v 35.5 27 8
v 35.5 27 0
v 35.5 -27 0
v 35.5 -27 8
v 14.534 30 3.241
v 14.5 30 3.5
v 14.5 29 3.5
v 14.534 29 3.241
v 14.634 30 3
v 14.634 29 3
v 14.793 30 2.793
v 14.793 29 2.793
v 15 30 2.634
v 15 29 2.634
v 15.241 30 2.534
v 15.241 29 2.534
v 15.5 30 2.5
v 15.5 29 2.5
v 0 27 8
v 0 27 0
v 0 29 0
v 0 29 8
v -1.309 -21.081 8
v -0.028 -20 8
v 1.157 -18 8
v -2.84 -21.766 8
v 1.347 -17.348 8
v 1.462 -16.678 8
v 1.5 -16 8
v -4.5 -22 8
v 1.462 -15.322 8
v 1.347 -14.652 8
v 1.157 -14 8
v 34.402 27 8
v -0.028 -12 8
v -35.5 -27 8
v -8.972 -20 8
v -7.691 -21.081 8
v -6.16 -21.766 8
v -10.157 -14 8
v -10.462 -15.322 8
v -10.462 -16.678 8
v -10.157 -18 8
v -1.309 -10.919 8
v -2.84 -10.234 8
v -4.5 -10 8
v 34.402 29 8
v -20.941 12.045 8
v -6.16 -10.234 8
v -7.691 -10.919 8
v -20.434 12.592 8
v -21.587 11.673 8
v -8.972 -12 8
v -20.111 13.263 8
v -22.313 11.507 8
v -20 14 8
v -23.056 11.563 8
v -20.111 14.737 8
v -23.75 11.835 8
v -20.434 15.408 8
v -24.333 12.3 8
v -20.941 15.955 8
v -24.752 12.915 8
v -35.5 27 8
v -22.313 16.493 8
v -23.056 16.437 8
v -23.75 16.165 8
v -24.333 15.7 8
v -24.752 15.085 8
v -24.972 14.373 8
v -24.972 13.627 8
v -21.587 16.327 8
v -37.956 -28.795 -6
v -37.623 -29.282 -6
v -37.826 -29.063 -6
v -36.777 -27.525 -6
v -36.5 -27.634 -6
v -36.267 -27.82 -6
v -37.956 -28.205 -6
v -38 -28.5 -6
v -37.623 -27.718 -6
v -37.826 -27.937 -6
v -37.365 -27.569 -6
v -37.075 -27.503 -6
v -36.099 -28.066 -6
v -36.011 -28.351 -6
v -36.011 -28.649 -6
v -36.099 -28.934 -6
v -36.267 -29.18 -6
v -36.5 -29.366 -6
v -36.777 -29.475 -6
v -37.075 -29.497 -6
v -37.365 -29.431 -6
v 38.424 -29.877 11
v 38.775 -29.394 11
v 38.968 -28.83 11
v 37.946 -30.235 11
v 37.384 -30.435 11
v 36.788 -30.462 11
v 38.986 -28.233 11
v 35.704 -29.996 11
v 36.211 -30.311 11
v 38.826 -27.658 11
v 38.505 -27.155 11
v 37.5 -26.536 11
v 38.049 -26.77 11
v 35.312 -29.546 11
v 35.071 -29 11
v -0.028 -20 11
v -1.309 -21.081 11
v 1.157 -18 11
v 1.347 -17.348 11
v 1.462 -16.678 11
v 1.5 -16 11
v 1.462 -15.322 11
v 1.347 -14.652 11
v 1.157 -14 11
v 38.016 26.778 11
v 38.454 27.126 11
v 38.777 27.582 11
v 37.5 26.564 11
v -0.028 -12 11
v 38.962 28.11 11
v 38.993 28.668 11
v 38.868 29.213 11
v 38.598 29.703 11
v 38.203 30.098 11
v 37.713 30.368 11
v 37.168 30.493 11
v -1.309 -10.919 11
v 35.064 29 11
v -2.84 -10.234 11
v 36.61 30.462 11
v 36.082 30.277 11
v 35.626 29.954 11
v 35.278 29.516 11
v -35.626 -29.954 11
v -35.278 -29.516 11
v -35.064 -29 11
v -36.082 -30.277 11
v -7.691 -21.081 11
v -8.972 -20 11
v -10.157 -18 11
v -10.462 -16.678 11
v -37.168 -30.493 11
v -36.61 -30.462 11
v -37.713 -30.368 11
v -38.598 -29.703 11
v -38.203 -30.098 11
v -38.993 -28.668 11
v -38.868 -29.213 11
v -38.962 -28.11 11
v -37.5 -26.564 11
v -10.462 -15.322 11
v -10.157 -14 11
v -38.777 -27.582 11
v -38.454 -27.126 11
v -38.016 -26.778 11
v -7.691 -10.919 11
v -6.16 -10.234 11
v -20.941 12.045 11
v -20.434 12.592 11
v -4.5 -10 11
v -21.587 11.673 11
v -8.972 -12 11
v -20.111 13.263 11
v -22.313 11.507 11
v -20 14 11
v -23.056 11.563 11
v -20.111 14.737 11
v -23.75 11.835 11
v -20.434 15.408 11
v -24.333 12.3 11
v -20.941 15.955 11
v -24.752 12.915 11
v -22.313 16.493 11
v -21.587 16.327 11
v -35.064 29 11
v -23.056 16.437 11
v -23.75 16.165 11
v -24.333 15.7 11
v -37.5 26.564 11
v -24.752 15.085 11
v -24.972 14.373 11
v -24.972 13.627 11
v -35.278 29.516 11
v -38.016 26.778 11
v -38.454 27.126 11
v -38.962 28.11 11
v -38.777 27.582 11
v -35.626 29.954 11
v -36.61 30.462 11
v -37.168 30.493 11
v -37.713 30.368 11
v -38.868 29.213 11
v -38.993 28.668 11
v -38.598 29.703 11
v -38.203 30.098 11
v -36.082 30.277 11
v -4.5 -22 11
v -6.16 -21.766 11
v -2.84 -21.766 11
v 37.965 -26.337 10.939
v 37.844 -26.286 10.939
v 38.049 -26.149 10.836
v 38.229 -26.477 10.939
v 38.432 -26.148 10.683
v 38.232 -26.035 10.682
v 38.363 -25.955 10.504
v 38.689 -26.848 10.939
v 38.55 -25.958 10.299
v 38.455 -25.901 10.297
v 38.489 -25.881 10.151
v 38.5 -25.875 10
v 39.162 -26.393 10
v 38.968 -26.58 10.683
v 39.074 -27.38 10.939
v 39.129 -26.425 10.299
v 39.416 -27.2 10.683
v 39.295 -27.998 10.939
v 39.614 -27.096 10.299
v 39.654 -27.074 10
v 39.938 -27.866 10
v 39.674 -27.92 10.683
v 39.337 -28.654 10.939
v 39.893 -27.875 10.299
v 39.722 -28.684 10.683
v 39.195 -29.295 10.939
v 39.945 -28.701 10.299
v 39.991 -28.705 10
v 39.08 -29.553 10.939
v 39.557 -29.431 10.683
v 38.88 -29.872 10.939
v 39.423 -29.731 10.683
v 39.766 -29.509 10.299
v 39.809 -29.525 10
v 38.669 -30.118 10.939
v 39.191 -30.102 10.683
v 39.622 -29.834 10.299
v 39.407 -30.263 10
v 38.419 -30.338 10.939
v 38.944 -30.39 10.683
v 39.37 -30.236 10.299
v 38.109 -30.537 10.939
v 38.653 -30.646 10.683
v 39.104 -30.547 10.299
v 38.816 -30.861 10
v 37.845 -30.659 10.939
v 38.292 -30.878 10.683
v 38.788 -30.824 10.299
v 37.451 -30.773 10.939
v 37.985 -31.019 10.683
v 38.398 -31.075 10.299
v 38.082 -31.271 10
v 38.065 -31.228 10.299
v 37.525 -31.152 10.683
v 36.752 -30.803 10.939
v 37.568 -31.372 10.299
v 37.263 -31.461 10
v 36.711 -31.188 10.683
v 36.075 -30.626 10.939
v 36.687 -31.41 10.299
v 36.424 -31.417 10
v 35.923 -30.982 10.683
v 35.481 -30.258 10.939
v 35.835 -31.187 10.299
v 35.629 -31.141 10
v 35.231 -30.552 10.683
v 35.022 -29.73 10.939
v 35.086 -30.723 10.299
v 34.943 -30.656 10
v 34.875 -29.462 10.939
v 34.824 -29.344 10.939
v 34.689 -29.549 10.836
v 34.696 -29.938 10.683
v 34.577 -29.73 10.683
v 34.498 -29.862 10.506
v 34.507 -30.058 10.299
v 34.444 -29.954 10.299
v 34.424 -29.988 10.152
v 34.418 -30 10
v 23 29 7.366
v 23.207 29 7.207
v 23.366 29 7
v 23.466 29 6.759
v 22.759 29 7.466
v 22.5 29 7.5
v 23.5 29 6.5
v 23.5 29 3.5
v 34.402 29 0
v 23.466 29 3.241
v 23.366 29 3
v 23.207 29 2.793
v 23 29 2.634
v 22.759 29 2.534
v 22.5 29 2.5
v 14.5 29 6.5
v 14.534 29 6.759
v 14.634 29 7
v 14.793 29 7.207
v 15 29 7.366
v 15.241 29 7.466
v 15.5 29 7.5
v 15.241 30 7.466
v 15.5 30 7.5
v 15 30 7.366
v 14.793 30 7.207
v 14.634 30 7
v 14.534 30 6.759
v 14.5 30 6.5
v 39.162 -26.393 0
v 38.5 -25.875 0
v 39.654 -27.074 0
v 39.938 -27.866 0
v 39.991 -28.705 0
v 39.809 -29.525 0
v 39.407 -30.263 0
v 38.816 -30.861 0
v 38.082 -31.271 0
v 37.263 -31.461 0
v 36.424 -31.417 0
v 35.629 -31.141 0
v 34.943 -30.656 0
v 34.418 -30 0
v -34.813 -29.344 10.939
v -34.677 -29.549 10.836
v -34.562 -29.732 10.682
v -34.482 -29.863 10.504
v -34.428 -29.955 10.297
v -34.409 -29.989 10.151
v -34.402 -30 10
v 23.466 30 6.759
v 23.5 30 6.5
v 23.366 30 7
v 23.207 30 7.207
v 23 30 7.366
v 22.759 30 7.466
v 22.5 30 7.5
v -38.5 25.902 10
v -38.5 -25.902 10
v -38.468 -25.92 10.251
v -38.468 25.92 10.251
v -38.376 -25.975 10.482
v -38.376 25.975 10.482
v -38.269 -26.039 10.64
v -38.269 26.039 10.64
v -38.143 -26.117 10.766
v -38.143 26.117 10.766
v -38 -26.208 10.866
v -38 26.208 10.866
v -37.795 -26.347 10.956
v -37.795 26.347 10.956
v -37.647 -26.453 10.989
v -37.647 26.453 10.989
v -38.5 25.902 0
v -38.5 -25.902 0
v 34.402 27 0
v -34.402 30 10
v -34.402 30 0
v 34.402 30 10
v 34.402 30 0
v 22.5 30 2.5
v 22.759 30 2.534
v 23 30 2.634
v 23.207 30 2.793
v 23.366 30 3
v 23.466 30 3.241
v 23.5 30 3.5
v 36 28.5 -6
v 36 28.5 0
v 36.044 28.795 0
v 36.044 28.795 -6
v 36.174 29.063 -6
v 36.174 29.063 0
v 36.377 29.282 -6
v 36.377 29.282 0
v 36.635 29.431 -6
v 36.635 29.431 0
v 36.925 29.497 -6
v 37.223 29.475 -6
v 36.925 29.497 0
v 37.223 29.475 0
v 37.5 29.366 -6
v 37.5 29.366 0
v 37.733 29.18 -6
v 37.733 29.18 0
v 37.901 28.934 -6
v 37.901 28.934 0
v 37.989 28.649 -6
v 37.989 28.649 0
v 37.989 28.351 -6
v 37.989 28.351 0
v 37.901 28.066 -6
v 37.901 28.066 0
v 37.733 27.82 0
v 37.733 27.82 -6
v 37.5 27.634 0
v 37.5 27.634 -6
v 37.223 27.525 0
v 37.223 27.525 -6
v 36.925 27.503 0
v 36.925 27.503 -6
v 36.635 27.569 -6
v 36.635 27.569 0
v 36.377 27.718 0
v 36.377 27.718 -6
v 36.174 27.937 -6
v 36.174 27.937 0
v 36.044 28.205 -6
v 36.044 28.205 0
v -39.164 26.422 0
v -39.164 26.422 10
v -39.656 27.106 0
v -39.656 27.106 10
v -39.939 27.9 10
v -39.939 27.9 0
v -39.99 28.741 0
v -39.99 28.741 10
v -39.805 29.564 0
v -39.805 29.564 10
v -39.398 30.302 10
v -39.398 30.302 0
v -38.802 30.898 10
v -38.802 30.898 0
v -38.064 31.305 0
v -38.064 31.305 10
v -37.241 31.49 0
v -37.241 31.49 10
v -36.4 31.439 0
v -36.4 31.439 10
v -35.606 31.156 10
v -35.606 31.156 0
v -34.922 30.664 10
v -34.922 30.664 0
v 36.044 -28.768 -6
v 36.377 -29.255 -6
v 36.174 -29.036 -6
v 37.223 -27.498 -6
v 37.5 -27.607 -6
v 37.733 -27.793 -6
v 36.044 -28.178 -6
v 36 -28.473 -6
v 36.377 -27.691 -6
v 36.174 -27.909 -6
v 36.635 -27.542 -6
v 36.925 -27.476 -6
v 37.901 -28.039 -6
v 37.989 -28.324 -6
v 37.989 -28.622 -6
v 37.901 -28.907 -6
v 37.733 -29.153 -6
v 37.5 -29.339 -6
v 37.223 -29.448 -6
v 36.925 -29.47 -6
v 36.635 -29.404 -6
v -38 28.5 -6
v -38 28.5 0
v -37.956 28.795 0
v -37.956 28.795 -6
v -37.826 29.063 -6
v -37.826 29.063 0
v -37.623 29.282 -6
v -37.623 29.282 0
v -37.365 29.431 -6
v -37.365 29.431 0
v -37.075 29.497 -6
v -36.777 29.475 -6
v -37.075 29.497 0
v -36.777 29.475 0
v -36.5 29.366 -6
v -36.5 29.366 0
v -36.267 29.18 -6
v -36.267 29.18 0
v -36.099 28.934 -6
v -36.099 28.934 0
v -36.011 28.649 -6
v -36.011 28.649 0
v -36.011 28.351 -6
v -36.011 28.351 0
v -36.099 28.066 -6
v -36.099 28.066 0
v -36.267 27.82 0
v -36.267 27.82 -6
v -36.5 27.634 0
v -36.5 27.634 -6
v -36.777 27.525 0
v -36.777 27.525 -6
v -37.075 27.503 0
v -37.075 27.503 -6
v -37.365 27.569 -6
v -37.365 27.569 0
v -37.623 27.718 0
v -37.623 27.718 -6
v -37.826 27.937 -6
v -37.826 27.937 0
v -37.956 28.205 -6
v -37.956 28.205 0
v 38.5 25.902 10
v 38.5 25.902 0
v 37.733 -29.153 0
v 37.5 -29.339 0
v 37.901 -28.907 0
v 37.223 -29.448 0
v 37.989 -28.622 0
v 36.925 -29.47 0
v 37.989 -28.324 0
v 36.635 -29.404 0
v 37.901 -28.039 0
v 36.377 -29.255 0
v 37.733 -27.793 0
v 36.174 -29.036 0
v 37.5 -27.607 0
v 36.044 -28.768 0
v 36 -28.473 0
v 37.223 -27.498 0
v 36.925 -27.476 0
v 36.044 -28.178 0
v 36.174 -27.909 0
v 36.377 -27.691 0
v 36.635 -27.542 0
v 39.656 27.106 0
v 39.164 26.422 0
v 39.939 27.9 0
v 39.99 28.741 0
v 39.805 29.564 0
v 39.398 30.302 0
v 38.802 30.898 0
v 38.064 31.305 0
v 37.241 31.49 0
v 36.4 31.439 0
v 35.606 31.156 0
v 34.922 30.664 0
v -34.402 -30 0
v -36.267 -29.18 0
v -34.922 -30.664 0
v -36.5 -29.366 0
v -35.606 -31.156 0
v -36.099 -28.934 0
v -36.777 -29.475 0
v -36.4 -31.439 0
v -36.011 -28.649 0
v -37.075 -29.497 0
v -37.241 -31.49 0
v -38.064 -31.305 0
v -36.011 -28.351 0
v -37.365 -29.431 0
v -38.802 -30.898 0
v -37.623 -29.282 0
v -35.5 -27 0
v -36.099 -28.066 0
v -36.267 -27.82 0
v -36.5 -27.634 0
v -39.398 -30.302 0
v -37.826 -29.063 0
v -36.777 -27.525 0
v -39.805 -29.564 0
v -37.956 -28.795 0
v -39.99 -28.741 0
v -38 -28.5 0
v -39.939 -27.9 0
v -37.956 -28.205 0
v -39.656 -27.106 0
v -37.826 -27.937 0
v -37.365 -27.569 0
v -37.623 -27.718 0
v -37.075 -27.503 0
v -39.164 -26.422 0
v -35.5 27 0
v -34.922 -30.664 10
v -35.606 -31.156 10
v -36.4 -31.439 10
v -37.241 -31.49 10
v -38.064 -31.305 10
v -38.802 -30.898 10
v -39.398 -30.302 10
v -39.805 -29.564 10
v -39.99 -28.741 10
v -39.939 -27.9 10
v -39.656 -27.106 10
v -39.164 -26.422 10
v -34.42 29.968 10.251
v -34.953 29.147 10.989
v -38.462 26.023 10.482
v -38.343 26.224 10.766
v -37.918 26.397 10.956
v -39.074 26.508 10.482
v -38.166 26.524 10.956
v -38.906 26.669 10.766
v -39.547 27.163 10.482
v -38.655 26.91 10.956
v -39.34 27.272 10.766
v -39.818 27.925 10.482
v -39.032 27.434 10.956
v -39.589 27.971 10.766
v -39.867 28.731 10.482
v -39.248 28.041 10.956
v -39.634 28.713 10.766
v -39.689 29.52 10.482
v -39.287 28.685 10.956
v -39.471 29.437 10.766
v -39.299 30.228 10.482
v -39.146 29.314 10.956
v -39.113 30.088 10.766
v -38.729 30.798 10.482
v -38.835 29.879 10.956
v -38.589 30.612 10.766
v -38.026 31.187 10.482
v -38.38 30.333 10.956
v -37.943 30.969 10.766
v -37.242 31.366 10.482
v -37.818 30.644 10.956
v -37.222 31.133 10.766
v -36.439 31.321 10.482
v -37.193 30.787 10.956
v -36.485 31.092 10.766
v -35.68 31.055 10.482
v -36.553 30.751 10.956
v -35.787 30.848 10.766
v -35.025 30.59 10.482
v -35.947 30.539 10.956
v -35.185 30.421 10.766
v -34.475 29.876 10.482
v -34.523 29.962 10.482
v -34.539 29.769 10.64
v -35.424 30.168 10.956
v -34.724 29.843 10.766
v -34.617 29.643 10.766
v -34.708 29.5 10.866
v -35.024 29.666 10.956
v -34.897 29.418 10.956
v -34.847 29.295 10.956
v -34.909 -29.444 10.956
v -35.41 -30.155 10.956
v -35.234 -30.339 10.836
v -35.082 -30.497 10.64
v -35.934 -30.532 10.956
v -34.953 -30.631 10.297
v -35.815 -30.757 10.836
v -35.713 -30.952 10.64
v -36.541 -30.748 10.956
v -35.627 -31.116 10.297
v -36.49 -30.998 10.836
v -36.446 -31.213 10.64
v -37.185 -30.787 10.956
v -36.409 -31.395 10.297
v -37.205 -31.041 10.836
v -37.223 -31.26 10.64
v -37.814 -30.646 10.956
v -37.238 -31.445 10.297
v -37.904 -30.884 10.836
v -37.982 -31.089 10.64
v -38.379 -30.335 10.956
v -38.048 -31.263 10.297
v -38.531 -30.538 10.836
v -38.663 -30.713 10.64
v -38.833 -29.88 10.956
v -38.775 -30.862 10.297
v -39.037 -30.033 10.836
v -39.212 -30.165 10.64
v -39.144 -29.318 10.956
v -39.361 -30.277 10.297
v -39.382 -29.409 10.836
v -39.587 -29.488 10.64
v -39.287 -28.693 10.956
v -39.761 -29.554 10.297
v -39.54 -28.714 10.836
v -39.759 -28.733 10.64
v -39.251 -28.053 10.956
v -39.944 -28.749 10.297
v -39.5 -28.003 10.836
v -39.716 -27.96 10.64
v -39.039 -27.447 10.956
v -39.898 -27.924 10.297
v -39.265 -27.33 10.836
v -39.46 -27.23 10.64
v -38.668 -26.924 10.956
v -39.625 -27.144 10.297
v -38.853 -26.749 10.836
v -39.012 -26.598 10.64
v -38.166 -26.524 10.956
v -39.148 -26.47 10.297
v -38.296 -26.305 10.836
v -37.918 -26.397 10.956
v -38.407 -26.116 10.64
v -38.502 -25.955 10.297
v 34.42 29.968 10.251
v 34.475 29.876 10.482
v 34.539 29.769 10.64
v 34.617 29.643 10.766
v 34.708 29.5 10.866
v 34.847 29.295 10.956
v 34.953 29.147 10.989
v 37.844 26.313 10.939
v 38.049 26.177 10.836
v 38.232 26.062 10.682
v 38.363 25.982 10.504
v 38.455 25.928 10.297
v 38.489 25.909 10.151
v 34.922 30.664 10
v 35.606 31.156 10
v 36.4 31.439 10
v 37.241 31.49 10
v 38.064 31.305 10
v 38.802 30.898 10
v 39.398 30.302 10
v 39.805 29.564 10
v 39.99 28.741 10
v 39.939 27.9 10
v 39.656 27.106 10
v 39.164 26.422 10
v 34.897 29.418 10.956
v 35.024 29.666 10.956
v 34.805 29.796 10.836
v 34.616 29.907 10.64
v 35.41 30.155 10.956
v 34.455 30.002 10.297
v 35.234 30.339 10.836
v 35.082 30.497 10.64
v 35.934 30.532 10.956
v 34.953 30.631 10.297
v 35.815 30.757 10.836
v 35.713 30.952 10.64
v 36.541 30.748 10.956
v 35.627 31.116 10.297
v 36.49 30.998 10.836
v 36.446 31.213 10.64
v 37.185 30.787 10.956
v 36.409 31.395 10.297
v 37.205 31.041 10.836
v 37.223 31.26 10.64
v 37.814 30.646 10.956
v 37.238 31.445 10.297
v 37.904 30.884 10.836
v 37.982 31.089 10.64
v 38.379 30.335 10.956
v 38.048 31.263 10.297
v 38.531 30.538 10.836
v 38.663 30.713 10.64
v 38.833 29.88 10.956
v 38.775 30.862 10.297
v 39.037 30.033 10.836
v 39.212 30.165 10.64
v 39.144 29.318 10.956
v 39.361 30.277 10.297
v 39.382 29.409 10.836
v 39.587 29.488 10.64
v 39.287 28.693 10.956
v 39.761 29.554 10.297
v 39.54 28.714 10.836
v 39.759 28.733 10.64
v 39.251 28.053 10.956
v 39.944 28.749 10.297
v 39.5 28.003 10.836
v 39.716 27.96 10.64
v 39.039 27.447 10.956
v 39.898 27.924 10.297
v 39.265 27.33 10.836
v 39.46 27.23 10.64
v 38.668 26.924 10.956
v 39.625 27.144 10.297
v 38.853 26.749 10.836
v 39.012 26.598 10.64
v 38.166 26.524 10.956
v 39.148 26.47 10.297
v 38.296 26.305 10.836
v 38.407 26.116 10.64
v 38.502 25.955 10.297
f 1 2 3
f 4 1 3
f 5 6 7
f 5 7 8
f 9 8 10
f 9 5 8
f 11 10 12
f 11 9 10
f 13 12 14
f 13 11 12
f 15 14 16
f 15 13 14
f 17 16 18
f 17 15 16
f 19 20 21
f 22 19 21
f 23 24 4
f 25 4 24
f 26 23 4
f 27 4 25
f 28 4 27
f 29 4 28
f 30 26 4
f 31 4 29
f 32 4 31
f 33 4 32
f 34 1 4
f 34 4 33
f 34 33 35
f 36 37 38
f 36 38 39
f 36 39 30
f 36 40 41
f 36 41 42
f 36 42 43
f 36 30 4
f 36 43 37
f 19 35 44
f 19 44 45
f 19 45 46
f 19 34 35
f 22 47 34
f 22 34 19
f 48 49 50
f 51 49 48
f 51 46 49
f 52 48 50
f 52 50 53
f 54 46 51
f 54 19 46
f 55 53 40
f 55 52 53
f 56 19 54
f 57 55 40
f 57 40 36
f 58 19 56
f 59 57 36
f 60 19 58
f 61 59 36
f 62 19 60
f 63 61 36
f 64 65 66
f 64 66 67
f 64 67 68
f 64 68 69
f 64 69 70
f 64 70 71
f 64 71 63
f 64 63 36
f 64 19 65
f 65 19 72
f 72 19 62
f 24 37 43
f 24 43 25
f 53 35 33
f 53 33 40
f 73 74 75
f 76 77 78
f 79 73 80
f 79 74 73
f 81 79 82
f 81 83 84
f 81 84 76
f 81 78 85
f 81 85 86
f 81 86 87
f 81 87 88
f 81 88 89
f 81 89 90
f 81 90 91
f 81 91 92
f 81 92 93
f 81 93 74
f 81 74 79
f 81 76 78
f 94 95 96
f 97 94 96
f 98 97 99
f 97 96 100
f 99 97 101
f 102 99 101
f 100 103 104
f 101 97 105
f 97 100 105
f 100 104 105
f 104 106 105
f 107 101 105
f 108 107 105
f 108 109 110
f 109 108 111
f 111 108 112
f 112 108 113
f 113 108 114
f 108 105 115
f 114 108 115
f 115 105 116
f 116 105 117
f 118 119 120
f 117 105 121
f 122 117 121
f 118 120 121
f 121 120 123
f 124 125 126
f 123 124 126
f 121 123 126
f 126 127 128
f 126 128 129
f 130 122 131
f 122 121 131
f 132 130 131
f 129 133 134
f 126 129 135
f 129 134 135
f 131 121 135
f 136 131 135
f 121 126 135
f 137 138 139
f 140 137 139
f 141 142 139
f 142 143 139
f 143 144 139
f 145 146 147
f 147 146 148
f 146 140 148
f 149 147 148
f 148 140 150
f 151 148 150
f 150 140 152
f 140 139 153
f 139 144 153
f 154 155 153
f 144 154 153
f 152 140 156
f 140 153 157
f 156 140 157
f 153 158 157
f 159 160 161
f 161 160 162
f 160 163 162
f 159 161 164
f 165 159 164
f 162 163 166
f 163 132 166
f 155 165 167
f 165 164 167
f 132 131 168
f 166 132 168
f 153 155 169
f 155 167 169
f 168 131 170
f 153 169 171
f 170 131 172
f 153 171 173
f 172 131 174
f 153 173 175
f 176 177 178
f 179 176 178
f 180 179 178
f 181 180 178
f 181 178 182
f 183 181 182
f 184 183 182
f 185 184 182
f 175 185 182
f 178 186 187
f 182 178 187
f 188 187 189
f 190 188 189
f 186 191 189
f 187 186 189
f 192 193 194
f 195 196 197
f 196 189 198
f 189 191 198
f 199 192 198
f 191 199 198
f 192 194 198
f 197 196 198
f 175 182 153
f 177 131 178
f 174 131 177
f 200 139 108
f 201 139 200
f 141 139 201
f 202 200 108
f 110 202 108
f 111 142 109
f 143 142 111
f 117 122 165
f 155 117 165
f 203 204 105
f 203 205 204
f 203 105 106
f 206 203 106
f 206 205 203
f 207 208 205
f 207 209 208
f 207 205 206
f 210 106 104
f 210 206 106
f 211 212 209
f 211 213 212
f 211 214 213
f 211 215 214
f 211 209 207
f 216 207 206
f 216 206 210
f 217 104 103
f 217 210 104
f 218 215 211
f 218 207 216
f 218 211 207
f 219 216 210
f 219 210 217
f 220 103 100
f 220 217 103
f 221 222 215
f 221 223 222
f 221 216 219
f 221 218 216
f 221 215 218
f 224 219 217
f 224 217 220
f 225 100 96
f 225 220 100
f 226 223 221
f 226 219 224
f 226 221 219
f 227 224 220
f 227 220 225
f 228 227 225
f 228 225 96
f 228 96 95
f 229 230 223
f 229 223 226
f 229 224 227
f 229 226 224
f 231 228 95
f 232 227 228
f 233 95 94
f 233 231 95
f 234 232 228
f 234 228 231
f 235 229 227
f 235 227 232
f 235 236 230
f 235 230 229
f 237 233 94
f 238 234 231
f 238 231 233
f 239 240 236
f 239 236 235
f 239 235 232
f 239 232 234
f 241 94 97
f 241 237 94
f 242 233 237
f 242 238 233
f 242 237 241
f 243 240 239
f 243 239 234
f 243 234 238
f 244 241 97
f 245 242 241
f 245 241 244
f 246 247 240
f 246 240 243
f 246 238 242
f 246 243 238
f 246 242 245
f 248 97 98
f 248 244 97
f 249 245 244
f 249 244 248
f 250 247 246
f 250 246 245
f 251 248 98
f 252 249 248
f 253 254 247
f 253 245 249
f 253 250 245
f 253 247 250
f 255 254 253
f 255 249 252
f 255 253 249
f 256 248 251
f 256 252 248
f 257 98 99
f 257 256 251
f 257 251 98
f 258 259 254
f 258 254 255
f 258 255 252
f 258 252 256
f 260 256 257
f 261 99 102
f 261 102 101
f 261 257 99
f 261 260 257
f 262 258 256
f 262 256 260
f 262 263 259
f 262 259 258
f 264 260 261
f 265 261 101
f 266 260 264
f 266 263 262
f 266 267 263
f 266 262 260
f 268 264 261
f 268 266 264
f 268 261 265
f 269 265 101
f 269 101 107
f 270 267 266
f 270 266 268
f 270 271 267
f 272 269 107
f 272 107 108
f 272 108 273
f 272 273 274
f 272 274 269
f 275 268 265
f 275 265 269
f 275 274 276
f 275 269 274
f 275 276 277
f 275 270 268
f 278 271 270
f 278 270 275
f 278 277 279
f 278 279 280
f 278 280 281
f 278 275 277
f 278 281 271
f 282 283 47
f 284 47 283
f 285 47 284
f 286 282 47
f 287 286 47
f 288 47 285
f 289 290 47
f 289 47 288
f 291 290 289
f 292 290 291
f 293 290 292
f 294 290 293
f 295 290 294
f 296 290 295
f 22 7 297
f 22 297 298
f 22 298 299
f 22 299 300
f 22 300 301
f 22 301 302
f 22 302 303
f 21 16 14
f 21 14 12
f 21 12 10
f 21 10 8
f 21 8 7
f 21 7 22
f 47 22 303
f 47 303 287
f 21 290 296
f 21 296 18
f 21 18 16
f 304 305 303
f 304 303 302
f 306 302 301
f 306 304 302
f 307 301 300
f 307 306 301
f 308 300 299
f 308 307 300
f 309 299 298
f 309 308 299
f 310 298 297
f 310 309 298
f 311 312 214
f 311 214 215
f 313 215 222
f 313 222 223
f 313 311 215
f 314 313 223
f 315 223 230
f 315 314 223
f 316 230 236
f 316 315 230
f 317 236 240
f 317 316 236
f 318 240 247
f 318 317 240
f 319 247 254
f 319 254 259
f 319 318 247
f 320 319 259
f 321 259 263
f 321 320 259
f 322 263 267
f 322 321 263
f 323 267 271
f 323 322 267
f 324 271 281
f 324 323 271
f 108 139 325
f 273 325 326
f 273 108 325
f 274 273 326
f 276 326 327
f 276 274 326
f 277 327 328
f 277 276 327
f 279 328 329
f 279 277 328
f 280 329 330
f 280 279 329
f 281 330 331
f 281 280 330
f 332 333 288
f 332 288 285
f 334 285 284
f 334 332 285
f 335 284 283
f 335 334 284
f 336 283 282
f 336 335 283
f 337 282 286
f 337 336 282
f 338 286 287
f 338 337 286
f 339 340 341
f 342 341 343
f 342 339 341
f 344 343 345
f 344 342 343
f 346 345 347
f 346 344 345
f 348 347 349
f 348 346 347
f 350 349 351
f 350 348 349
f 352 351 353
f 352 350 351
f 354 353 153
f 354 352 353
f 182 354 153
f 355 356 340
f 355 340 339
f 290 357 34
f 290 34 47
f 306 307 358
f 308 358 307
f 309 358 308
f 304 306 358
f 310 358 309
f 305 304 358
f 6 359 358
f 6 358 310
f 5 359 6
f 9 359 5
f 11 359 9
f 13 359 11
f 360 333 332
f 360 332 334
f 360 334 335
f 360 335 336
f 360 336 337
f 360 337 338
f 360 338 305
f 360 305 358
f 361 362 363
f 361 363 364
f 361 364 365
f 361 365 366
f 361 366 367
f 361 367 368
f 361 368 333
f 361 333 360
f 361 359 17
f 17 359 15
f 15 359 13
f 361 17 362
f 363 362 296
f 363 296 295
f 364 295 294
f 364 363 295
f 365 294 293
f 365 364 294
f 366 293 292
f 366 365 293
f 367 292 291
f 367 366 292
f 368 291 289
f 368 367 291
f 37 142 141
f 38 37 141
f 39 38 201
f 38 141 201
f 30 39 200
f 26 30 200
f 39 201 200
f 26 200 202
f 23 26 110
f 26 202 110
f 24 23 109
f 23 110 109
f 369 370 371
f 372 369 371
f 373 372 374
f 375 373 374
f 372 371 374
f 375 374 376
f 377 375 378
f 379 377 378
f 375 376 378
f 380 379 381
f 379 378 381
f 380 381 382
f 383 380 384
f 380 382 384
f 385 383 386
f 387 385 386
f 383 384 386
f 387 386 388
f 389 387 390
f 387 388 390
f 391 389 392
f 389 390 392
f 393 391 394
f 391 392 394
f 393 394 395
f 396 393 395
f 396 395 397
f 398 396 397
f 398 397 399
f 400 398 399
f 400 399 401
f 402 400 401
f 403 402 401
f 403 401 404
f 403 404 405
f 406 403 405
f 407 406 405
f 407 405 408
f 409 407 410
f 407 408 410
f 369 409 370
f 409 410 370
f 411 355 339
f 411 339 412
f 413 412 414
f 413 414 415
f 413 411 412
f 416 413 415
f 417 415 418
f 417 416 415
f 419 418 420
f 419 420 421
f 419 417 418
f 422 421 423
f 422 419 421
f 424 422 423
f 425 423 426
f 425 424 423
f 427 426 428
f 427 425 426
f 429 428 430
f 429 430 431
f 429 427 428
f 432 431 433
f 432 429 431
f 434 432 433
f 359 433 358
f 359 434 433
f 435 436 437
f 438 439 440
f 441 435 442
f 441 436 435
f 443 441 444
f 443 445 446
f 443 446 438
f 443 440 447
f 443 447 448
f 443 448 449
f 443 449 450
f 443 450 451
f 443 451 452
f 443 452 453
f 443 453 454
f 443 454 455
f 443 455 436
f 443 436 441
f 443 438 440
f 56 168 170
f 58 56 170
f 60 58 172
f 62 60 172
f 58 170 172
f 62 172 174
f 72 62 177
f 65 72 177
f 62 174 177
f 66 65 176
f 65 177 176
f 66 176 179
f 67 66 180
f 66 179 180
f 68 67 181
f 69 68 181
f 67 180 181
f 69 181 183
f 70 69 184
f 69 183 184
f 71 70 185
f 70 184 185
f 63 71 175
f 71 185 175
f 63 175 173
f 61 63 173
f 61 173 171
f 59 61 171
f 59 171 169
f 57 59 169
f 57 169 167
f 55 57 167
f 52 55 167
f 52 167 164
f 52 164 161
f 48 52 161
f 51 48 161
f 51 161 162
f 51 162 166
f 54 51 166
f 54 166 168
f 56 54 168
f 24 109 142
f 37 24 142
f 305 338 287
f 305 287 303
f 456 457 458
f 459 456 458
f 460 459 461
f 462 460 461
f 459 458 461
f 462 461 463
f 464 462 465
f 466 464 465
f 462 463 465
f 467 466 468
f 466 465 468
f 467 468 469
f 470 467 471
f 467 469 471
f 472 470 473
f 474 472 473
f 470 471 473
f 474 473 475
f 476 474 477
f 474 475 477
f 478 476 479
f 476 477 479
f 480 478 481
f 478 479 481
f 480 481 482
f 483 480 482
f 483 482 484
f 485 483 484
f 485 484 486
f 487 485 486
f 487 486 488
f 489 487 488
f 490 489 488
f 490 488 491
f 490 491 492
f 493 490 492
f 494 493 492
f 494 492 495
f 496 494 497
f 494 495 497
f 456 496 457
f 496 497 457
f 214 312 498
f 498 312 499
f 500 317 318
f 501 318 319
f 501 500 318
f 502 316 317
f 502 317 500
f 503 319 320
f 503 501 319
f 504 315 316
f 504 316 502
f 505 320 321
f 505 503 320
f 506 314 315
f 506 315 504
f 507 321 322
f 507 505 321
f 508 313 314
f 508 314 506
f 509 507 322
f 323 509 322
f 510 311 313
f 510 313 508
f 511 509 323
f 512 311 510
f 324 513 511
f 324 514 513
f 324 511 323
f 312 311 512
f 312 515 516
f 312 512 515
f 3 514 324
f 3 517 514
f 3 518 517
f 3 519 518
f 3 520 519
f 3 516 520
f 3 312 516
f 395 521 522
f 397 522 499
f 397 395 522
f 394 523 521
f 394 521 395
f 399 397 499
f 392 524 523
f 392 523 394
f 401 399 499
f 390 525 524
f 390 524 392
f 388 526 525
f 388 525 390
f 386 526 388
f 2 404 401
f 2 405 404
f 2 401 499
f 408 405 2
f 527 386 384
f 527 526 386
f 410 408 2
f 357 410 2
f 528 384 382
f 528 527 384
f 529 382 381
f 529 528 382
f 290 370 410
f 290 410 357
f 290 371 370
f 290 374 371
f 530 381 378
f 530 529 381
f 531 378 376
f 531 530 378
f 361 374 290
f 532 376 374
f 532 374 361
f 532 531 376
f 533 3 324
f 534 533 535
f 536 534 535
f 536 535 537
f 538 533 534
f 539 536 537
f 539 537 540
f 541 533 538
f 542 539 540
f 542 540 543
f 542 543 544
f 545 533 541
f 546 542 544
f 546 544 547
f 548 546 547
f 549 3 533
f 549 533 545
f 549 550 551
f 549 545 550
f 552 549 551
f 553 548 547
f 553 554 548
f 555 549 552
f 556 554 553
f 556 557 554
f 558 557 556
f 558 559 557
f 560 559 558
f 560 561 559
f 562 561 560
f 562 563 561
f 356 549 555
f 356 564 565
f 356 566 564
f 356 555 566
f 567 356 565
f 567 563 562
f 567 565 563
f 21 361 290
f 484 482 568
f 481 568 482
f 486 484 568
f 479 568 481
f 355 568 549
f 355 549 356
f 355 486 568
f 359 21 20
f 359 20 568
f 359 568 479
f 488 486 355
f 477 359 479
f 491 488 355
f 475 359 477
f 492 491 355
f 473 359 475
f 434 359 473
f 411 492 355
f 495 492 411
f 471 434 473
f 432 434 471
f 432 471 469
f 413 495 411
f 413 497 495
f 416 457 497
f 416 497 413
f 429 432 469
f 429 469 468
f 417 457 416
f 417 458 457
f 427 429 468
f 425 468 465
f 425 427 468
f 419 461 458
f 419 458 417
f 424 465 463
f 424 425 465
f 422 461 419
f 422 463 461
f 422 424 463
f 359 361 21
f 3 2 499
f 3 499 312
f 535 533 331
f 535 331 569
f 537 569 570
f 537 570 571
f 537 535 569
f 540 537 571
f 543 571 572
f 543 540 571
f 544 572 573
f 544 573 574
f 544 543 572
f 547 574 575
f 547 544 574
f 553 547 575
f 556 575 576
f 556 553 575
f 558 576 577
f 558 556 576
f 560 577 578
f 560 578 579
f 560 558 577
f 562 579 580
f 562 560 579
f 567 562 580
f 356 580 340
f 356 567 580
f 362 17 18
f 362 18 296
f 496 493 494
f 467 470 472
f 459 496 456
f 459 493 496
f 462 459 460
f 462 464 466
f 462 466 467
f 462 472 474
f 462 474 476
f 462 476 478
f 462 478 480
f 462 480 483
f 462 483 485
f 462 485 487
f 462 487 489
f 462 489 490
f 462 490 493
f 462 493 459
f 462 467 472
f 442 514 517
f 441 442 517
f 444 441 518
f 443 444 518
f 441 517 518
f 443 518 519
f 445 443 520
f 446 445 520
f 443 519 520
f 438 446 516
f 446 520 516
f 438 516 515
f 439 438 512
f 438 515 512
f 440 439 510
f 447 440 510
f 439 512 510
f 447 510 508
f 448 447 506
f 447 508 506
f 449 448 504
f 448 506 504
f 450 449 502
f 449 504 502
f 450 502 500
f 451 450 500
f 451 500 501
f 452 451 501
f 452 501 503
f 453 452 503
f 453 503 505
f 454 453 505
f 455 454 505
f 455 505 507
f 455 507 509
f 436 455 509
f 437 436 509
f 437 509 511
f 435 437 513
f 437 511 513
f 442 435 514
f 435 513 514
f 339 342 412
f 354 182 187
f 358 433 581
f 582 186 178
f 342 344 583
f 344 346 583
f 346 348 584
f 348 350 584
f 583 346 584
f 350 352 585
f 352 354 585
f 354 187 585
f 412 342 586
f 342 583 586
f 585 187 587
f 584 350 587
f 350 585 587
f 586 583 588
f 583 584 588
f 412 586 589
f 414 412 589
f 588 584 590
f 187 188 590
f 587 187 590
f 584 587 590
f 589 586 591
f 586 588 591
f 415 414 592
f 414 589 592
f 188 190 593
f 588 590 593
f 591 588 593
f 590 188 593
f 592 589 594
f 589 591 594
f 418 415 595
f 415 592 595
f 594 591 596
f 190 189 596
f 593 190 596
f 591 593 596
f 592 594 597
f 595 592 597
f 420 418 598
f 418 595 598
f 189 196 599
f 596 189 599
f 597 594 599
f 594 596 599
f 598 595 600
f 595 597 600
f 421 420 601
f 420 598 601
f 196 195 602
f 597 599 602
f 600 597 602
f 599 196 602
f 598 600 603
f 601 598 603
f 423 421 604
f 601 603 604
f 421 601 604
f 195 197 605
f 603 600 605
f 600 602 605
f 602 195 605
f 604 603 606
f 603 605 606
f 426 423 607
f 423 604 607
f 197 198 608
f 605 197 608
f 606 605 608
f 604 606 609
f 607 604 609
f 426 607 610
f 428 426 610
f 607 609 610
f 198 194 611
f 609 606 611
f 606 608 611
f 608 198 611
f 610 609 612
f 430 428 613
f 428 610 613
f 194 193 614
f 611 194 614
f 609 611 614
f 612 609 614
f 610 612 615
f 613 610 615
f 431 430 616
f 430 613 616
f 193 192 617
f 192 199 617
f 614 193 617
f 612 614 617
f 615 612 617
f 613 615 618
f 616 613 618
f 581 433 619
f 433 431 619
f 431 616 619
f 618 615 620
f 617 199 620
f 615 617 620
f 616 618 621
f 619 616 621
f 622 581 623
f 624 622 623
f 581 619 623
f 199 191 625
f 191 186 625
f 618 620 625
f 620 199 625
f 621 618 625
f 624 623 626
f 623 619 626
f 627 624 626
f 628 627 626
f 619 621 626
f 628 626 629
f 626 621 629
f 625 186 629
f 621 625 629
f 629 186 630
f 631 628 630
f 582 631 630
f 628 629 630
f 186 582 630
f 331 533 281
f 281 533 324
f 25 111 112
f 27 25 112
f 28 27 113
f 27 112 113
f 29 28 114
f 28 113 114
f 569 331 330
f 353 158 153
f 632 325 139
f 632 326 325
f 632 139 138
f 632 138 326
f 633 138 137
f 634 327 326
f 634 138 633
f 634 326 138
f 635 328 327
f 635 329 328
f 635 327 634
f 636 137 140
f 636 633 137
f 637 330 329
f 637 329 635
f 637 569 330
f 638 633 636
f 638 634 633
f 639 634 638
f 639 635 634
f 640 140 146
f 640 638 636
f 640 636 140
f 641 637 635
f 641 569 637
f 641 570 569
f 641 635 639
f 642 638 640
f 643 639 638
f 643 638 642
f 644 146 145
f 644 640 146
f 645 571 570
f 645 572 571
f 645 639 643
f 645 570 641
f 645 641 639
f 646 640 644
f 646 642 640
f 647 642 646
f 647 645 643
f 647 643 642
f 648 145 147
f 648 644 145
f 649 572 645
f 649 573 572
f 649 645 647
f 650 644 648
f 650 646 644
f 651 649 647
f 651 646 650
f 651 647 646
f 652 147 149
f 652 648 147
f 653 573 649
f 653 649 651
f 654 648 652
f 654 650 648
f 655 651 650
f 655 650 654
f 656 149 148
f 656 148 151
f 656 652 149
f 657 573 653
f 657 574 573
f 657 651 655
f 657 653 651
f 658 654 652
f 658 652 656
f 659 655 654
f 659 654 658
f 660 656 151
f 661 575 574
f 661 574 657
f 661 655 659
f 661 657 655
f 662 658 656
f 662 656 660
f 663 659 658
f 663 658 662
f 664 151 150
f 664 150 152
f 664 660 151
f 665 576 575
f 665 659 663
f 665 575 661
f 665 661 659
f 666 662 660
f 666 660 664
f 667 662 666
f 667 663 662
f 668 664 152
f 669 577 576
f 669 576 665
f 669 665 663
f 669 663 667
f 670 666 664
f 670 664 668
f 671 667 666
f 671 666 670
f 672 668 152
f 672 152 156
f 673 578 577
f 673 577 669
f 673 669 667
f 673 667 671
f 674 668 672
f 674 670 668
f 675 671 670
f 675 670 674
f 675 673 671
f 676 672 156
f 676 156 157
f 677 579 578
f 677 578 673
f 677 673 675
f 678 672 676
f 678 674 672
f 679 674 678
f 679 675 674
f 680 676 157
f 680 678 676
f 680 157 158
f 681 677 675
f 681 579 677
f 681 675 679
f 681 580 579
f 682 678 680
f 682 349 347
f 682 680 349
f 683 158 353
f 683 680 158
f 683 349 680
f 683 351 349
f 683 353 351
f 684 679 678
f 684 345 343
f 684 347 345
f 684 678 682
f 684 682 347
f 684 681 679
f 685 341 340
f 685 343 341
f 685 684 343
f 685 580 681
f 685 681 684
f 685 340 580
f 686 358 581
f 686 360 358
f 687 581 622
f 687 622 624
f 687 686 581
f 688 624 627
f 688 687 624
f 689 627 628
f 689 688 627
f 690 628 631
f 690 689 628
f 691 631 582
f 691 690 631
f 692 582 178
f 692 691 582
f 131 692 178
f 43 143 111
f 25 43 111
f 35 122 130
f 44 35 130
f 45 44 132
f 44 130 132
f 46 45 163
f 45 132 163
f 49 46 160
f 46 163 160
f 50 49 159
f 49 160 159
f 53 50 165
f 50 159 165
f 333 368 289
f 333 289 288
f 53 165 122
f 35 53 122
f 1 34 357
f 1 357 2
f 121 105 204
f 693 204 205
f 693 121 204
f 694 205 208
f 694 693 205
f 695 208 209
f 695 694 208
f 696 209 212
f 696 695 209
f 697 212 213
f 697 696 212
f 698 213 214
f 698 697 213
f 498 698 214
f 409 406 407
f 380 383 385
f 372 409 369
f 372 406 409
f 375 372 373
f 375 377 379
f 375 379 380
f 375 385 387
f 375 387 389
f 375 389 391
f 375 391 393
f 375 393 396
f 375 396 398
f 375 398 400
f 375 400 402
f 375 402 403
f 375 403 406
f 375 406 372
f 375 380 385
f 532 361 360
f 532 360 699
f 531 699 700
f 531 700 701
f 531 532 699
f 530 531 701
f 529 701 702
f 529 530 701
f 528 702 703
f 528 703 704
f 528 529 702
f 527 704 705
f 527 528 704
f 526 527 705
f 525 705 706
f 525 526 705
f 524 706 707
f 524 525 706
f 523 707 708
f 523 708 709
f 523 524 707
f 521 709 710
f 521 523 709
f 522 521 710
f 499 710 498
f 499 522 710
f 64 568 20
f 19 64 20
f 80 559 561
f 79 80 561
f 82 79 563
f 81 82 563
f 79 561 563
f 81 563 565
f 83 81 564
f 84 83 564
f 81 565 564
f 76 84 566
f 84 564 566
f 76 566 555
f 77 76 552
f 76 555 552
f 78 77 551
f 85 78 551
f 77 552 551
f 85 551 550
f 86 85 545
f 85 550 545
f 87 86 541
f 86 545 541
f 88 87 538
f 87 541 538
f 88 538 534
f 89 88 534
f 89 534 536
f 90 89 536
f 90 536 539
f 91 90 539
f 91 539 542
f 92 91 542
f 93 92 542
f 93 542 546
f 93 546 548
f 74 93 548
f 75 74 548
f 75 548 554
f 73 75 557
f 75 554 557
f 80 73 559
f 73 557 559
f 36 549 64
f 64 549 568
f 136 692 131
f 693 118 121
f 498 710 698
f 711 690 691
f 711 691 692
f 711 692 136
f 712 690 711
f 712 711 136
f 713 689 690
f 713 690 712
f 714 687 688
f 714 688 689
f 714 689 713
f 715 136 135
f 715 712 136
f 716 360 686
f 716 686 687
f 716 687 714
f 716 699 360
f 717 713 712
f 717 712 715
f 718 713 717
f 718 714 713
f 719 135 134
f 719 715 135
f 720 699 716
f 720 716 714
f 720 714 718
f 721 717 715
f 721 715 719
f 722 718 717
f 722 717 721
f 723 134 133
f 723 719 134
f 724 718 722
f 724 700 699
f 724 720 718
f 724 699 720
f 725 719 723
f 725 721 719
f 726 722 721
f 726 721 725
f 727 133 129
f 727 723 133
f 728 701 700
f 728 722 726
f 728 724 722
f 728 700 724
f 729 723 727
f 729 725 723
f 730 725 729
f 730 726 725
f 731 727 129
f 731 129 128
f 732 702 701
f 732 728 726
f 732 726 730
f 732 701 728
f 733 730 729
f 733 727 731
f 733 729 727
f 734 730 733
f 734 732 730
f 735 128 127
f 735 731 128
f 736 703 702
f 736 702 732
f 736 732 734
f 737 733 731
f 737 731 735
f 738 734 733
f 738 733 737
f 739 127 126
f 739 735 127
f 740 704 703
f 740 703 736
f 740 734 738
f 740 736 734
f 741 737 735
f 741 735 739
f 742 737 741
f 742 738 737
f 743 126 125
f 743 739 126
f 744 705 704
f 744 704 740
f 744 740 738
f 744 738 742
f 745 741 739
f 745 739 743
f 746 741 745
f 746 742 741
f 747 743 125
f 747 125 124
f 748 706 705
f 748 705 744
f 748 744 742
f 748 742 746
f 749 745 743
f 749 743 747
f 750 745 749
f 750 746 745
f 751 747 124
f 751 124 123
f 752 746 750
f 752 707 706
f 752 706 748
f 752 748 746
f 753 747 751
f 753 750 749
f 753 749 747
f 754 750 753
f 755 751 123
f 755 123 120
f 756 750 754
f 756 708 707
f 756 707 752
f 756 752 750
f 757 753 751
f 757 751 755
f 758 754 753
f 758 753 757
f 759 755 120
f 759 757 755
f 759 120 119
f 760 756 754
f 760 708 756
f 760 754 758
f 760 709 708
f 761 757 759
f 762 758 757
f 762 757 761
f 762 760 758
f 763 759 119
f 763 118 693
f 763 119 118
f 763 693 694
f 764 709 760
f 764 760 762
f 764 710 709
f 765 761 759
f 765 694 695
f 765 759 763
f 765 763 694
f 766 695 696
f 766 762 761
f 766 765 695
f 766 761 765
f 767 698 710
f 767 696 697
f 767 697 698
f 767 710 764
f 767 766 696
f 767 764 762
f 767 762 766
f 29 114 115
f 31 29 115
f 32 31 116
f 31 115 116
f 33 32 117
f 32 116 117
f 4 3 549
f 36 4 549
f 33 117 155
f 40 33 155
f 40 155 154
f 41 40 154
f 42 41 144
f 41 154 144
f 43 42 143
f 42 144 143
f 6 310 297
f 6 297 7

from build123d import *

# Parameters (mm, degrees)
SKETCH2_R                  = 1.75
BOSS_EXTRUDE1_DEPTH        = 8
BOSS_EXTRUDE1_DEPTH_BACK   = 12
BOSS_EXTRUDE1_2_DEPTH      = 8
BOSS_EXTRUDE1_2_DEPTH_BACK = 12
BOSS_EXTRUDE1_3_DEPTH      = 8
BOSS_EXTRUDE1_3_DEPTH_BACK = 12
BOSS_EXTRUDE1_4_DEPTH      = 8
BOSS_EXTRUDE1_4_DEPTH_BACK = 12
SKETCH3_W                  = 77
SKETCH3_H                  = 60
SKETCH3_W_2                = 71
SKETCH3_H_2                = 54
BOSS_EXTRUDE2_DEPTH        = 8
SKETCH4_W                  = 77
SKETCH4_H                  = 60
BOSS_EXTRUDE3_DEPTH        = 3
CUT_EXTRUDE6_DEPTH         = 20
CUT_EXTRUDE8_DEPTH         = 13
CUT_EXTRUDE9_DEPTH         = 10
SKETCH17_R                 = 1
BOSS_EXTRUDE5_DEPTH        = 6
BOSS_EXTRUDE5_DEPTH_BACK   = 7
FILLET1_R                  = 1
BOSS_EXTRUDE6_DEPTH        = 11
FILLET3_R                  = 1
SKETCH20_R                 = 2.5
CUT_EXTRUDE10_DEPTH        = 10
SKETCH22_W                 = 34.401923789
SKETCH22_H                 = 2
CUT_EXTRUDE11_DEPTH        = 8


with BuildPart() as part:
    # Sketch2 → Boss-Extrude1 (new body, two sides)
    with BuildSketch(Plane.XY) as boss_extrude1_sk:
        with BuildLine():
            Line((-35.5, -27), (-25.5, -27))
            ThreePointArc((-25.5, -27), (-28.428932188, -19.928932188), (-35.5, -17))
            Line((-35.5, -17), (-35.5, -27))
        make_face()
        with Locations((-33, -23)):
            Circle(SKETCH2_R, mode=Mode.SUBTRACT)
    extrude(amount=BOSS_EXTRUDE1_DEPTH)
    extrude(boss_extrude1_sk.sketch, amount=-BOSS_EXTRUDE1_DEPTH_BACK)



with BuildPart() as body_2:
    # Sketch2 → Boss-Extrude1 2 (new body, two sides)
    with BuildSketch(Plane.XY) as boss_extrude1_2_sk:
        with BuildLine():
            Line((35.5, 27), (35.5, 17))
            ThreePointArc((35.5, 17), (28.428932188, 19.928932188), (25.5, 27))
            Line((25.5, 27), (35.5, 27))
        make_face()
        with Locations((33, 21)):
            Circle(SKETCH2_R, mode=Mode.SUBTRACT)
    extrude(amount=BOSS_EXTRUDE1_2_DEPTH)
    extrude(boss_extrude1_2_sk.sketch, amount=-BOSS_EXTRUDE1_2_DEPTH_BACK)


with BuildPart() as body_3:
    # Sketch2 → Boss-Extrude1 3 (new body, two sides)
    with BuildSketch(Plane.XY) as boss_extrude1_3_sk:
        with BuildLine():
            Line((-35.5, 27), (-25.5, 27))
            ThreePointArc((-25.5, 27), (-28.428932188, 19.928932188), (-35.5, 17))
            Line((-35.5, 17), (-35.5, 27))
        make_face()
        with Locations((-33, 21)):
            Circle(SKETCH2_R, mode=Mode.SUBTRACT)
    extrude(amount=BOSS_EXTRUDE1_3_DEPTH)
    extrude(boss_extrude1_3_sk.sketch, amount=-BOSS_EXTRUDE1_3_DEPTH_BACK)


with BuildPart() as body_4:
    # Sketch2 → Boss-Extrude1 4 (new body, two sides)
    with BuildSketch(Plane.XY) as boss_extrude1_4_sk:
        with BuildLine():
            Line((35.5, -17), (35.5, -27))
            Line((35.5, -27), (25.5, -27))
            ThreePointArc((25.5, -27), (28.428932188, -19.928932188), (35.5, -17))
        make_face()
        with Locations((33, -23)):
            Circle(SKETCH2_R, mode=Mode.SUBTRACT)
    extrude(amount=BOSS_EXTRUDE1_4_DEPTH)
    extrude(boss_extrude1_4_sk.sketch, amount=-BOSS_EXTRUDE1_4_DEPTH_BACK)


with BuildPart() as part_1:
    add(part.part)

    add(body_2.part)  # Boss-Extrude2 merges body 2

    add(body_3.part)  # Boss-Extrude2 merges body 3

    add(body_4.part)  # Boss-Extrude2 merges body 4
    # Sketch3 → Boss-Extrude2 (add)
    with BuildSketch(Plane.XY):
        Rectangle(SKETCH3_W, SKETCH3_H)
        Rectangle(SKETCH3_W_2, SKETCH3_H_2, mode=Mode.SUBTRACT)
    extrude(amount=BOSS_EXTRUDE2_DEPTH)

    # Sketch4 → Boss-Extrude3 (add)
    with BuildSketch(Plane.XY.offset(8)):
        Rectangle(SKETCH4_W, SKETCH4_H)
    extrude(amount=BOSS_EXTRUDE3_DEPTH)

    # Sketch12 → Cut-Extrude6 (cut)
    with BuildSketch(Plane(origin=(0, 0, -12), x_dir=(-1, 0, 0), z_dir=(0, 0, -1))):
        with BuildLine():
            Line((-35.5, -27), (-25.5, -27))
            ThreePointArc((-25.5, -27), (-28.428932188, -19.928932188), (-35.5, -17))
            Line((-35.5, -17), (-35.5, -27))
        make_face()
        with BuildLine():
            Line((35.5, -27), (35.5, -17))
            ThreePointArc((35.5, -17), (28.428932188, -19.928932188), (25.5, -27))
            Line((25.5, -27), (35.5, -27))
        make_face()
        with BuildLine():
            Line((35.5, 17), (35.5, 27))
            Line((35.5, 27), (25.5, 27))
            ThreePointArc((25.5, 27), (28.428932188, 19.928932188), (35.5, 17))
        make_face()
        with BuildLine():
            Line((-25.5, 27), (-35.5, 27))
            Line((-35.5, 27), (-35.5, 17))
            ThreePointArc((-35.5, 17), (-28.428932188, 19.928932188), (-25.5, 27))
        make_face()
    extrude(amount=-CUT_EXTRUDE6_DEPTH, mode=Mode.SUBTRACT)

    # Sketch14 → Cut-Extrude8 (cut)
    with BuildSketch(Plane(origin=(0, 30, 0), x_dir=(1, 0, 0), z_dir=(0, 1, 0))):
        with BuildLine():
            Line((22.5, -7.5), (15.5, -7.5))
            ThreePointArc((15.5, -7.5), (14.792893219, -7.207106781), (14.5, -6.5))
            Line((14.5, -6.5), (14.5, -3.5))
            ThreePointArc((14.5, -3.5), (14.792893219, -2.792893219), (15.5, -2.5))
            Line((15.5, -2.5), (22.5, -2.5))
            ThreePointArc((22.5, -2.5), (23.207106781, -2.792893219), (23.5, -3.5))
            Line((23.5, -3.5), (23.5, -6.5))
            ThreePointArc((23.5, -6.5), (23.207106781, -7.207106781), (22.5, -7.5))
        make_face()
    extrude(amount=-CUT_EXTRUDE8_DEPTH, mode=Mode.SUBTRACT)

    # Sketch15 → Cut-Extrude9 (cut)
    with BuildSketch(Plane.XY.offset(11)):
        with BuildLine():
            ThreePointArc((-0.027864045, -12), (-4.5, -10), (-8.972135955, -12))
            Line((-8.972135955, -12), (-0.027864045, -12))
        make_face()
        with BuildLine():
            Line((1.156854249, -14), (-10.156854249, -14))
            ThreePointArc((-10.156854249, -14), (-10.5, -16), (-10.156854249, -18))
            Line((-10.156854249, -18), (1.156854249, -18))
            ThreePointArc((1.156854249, -18), (1.413591358, -17.014611872), (1.5, -16))
            ThreePointArc((1.5, -16), (1.413591358, -14.985388128), (1.156854249, -14))
        make_face()
        with BuildLine():
            Line((-0.027864045, -20), (-8.972135955, -20))
            ThreePointArc((-8.972135955, -20), (-4.5, -22), (-0.027864045, -20))
        make_face()
    extrude(amount=-CUT_EXTRUDE9_DEPTH, mode=Mode.SUBTRACT)

    # Sketch17 → Boss-Extrude5 (add, two sides)
    with BuildSketch(Plane(origin=(0, 0, 0), x_dir=(-1, 0, 0), z_dir=(0, 0, -1))) as boss_extrude5_sk:
        with Locations((-37, 28.5)):
            Circle(SKETCH17_R)
        with Locations((37, 28.5)):
            Circle(SKETCH17_R)
        with Locations((37, -28.5)):
            Circle(SKETCH17_R)
        with Locations((-37, -28.472787798)):
            Circle(SKETCH17_R)
    extrude(amount=BOSS_EXTRUDE5_DEPTH)
    extrude(boss_extrude5_sk.sketch, amount=-BOSS_EXTRUDE5_DEPTH_BACK)

    # Fillet1
    fillet1_edges = [part_1.edges().sort_by_distance(p)[0] for p in [
        (-38.5, 30, 5.5),
        (38.5, 30, 5.5),
        (38.5, -30, 5.5),
        (-38.5, -30, 5.5),
    ]]
    fillet(fillet1_edges, radius=FILLET1_R)

    # Sketch19 → Boss-Extrude6 (add)
    with BuildSketch(Plane(origin=(0, 0, 0), x_dir=(-1, 0, 0), z_dir=(0, 0, -1))):
        with BuildLine():
            Line((38.5, 29), (38.5, 25.901923789))
            ThreePointArc((38.5, 25.901923789), (39.121320344, 30.621320344), (34.401923789, 30))
            Line((34.401923789, 30), (37.5, 30))
            ThreePointArc((37.5, 30), (38.207106781, 29.707106781), (38.5, 29))
        make_face()
        with BuildLine():
            Line((37.5, -30), (34.401923789, -30))
            ThreePointArc((34.401923789, -30), (39.121320344, -30.621320344), (38.5, -25.901923789))
            Line((38.5, -25.901923789), (38.5, -29))
            ThreePointArc((38.5, -29), (38.207106781, -29.707106781), (37.5, -30))
        make_face()
        with BuildLine():
            Line((-38.5, -29), (-38.5, -25.874711587))
            ThreePointArc((-38.5, -25.874711587), (-39.13243436, -30.582935589), (-34.417825937, -30))
            Line((-34.417825937, -30), (-37.5, -30))
            ThreePointArc((-37.5, -30), (-38.207106781, -29.707106781), (-38.5, -29))
        make_face()
        with BuildLine():
            Line((-37.5, 30), (-34.401923789, 30))
            ThreePointArc((-34.401923789, 30), (-39.121320344, 30.621320344), (-38.5, 25.901923789))
            Line((-38.5, 25.901923789), (-38.5, 29))
            ThreePointArc((-38.5, 29), (-38.207106781, 29.707106781), (-37.5, 30))
        make_face()
    extrude(amount=-BOSS_EXTRUDE6_DEPTH)

    # Fillet3
    fillet3_edges = [part_1.edges().sort_by_distance(p)[0] for p in [
        (-38.5, 0, 11),
        (-39.121320344, 30.621320344, 11),
        (0.007951074, -30, 11),
        (-39.121320344, -30.621320344, 11),
        (38.5, 0.013606101, 11),
        (39.13243436, -30.582935589, 11),
        (0, 30, 11),
        (39.121320344, 30.621320344, 11),
    ]]
    fillet(fillet3_edges, radius=FILLET3_R)

    # Sketch20 → Cut-Extrude10 (cut)
    with BuildSketch(Plane.XY.offset(11)):
        with Locations((-22.5, 14)):
            Circle(SKETCH20_R)
    extrude(amount=-CUT_EXTRUDE10_DEPTH, mode=Mode.SUBTRACT)

    # Sketch22 → Cut-Extrude11 (cut)
    with BuildSketch(Plane(origin=(0, 0, 0), x_dir=(-1, 0, 0), z_dir=(0, 0, -1))):
        with Locations((-17.200961895, 28)):
            Rectangle(SKETCH22_W, SKETCH22_H)
    extrude(amount=-CUT_EXTRUDE11_DEPTH, mode=Mode.SUBTRACT)


solid = part_1.part
